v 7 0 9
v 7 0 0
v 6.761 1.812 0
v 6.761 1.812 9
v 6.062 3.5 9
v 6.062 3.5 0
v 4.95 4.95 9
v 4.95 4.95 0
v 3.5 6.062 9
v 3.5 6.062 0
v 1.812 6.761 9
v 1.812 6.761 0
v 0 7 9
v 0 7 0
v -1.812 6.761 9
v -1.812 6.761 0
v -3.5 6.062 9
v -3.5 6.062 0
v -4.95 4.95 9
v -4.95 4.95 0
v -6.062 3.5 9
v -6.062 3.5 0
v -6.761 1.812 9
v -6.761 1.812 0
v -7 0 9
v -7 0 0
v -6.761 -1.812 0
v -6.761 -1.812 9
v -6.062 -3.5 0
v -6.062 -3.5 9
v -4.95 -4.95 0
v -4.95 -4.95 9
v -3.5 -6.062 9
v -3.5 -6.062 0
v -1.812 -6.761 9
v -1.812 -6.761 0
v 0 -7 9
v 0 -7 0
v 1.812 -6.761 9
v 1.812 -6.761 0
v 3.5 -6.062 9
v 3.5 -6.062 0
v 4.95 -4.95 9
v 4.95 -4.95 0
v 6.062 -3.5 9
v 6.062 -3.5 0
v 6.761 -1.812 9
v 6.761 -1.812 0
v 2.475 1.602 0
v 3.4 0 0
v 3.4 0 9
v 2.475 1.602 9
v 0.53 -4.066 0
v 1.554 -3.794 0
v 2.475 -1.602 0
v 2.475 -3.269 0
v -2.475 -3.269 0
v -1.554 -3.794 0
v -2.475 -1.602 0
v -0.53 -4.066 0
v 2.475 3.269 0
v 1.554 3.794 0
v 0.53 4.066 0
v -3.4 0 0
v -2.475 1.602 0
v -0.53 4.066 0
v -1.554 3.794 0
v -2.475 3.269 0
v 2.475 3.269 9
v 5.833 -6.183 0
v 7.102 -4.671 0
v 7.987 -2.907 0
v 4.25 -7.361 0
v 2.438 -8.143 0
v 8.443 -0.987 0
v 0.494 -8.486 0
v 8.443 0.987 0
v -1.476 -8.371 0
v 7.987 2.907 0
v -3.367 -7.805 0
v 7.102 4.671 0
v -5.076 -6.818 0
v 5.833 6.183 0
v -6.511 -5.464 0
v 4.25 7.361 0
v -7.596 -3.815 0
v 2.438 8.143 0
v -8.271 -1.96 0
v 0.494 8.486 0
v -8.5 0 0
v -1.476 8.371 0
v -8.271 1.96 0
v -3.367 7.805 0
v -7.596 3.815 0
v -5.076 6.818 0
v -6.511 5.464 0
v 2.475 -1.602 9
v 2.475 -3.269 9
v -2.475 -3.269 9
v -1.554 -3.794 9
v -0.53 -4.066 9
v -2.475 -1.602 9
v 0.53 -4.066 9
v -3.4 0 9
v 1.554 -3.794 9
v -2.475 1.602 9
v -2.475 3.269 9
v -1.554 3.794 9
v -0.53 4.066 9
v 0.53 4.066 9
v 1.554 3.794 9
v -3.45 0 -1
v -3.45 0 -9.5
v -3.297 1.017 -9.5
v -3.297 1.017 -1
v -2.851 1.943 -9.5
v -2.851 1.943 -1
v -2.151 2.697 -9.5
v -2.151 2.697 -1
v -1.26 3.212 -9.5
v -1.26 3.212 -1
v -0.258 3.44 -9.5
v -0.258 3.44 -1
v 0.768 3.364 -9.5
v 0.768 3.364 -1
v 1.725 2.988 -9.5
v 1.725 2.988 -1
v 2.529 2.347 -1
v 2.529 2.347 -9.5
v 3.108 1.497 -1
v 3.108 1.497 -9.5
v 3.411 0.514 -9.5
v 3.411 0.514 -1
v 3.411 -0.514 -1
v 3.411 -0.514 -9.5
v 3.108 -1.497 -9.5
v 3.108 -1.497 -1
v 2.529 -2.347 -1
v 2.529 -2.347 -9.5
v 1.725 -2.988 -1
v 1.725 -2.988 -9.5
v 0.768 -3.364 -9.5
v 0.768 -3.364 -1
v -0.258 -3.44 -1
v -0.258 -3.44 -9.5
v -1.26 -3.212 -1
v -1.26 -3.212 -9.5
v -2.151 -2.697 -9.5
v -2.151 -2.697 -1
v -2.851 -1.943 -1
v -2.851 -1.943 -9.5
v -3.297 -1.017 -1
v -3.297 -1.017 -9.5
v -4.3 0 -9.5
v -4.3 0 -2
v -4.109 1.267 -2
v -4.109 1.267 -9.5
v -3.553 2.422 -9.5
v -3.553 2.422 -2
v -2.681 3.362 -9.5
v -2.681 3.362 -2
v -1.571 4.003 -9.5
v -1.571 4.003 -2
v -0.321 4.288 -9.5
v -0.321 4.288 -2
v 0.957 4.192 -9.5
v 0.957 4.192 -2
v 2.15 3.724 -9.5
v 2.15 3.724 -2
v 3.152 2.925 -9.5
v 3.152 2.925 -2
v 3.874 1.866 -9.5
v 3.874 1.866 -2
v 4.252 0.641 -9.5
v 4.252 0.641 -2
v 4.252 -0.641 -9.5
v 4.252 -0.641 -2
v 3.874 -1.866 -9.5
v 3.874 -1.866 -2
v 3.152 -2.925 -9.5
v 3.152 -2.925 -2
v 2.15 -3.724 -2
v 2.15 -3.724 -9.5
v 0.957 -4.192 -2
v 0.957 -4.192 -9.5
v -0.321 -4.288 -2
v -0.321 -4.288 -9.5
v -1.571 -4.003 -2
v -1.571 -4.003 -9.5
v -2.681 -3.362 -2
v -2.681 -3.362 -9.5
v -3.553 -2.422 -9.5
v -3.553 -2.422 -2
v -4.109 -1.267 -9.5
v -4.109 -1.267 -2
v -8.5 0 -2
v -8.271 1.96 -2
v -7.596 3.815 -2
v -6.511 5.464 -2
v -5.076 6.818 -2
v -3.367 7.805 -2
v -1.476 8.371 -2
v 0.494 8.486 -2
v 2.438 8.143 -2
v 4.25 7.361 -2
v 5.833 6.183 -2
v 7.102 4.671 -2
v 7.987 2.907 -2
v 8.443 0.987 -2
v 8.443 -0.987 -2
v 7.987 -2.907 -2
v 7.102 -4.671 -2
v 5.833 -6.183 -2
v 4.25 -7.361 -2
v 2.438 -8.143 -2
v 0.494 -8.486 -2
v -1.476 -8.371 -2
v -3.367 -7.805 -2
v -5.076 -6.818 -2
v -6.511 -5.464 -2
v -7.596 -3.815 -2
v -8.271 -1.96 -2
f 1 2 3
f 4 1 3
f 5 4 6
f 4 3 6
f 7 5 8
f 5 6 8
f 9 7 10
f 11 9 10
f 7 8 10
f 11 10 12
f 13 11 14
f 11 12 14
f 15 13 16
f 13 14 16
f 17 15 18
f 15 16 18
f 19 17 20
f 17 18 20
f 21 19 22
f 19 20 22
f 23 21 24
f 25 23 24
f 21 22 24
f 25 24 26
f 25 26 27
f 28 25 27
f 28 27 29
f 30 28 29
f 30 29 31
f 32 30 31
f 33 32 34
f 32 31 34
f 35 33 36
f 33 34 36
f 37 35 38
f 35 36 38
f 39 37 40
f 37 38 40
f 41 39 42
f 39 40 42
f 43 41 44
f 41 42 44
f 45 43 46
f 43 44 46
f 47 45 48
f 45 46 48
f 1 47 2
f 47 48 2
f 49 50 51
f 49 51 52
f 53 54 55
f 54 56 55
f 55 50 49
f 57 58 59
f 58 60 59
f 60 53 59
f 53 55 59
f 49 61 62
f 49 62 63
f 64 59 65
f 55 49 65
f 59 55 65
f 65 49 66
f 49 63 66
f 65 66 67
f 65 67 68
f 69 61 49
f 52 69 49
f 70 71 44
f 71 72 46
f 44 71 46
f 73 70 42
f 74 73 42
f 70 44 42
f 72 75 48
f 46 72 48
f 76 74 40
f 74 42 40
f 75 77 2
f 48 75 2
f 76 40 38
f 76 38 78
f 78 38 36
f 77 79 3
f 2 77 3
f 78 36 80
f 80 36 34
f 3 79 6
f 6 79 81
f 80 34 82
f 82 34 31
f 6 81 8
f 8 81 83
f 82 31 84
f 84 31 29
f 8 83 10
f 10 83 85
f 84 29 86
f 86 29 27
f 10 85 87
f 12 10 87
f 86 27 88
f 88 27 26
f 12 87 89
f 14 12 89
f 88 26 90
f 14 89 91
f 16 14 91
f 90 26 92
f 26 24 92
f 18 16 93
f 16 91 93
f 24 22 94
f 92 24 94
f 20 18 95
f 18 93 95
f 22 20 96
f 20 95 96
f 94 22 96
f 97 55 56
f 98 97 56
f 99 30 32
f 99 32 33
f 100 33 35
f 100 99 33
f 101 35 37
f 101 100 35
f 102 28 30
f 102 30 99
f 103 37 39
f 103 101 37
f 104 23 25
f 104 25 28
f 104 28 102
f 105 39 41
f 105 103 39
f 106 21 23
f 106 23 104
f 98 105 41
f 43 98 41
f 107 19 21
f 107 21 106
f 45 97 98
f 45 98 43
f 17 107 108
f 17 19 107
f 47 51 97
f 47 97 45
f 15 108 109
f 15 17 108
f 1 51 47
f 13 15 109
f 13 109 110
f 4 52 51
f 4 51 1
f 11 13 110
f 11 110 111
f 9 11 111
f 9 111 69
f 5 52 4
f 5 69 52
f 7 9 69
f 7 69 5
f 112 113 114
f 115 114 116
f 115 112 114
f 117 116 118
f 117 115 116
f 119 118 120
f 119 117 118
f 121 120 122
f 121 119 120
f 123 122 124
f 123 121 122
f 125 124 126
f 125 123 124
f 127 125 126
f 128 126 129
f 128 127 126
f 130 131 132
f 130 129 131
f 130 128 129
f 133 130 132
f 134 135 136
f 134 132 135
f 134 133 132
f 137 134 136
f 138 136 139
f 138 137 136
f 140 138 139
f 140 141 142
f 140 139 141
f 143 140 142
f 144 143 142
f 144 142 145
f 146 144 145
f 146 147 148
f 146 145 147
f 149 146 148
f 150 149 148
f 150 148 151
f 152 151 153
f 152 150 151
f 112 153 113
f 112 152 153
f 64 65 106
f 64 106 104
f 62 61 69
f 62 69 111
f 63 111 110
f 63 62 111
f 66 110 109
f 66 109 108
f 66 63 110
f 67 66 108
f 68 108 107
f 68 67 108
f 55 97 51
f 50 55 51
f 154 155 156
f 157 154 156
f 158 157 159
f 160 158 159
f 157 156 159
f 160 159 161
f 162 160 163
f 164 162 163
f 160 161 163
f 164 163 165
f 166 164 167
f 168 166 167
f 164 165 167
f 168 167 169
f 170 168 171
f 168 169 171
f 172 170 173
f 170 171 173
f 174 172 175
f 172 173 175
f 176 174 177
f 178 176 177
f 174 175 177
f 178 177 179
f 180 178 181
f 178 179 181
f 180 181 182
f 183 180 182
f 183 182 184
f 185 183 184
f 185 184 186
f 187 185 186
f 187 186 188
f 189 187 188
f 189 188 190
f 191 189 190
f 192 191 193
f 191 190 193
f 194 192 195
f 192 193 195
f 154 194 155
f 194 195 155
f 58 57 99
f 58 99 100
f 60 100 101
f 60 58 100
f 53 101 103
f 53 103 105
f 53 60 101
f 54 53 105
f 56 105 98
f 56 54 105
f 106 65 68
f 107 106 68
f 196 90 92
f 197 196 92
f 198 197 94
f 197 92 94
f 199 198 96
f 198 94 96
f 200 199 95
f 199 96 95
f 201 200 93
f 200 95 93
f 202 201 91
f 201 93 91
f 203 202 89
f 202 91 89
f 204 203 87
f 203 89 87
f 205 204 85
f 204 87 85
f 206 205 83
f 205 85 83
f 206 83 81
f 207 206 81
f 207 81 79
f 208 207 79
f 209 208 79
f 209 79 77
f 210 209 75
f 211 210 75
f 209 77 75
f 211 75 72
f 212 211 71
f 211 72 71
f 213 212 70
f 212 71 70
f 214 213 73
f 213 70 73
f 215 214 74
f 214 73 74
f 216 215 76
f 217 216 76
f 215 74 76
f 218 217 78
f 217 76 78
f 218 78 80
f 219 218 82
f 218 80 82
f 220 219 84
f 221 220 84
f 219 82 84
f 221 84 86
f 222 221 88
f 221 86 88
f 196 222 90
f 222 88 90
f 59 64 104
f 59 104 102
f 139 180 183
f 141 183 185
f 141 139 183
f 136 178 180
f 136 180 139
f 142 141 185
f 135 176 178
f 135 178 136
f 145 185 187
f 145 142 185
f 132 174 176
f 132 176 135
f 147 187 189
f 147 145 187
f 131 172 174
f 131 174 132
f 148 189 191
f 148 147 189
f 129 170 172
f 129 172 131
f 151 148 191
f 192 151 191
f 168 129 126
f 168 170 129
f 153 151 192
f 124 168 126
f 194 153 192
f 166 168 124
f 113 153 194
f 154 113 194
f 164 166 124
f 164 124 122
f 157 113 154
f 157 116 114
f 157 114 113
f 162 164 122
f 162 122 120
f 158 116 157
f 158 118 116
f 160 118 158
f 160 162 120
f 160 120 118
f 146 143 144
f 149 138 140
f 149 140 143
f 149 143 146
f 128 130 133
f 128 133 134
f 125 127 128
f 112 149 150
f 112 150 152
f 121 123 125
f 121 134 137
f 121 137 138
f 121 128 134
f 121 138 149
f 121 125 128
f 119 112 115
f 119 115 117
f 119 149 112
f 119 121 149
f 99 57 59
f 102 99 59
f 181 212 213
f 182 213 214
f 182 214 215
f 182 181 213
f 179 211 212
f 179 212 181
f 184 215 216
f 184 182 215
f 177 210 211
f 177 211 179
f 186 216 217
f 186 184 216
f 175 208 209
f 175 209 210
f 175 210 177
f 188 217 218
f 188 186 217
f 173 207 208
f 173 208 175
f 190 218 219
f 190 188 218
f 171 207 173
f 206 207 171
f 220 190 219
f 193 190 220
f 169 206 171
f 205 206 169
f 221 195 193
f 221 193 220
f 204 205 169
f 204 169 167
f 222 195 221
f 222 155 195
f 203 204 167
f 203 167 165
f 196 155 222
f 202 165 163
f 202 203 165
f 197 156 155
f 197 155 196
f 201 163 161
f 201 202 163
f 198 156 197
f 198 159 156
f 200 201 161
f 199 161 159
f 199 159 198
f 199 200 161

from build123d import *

# Parameters (mm, degrees)
SKETCH1_R               = 7
SKETCH1_R_2             = 4.1
BOSS_EXTRUDE1_DEPTH     = 9
SKETCH5_R               = 8.5
BOSS_EXTRUDE3_DEPTH     = 2
CUT_EXTRUDE4_DEPTH      = 16.016657418
SKETCH10_R              = 4.3
BOSS_EXTRUDE4_DEPTH     = 7.5
CUT_EXTRUDE8_DEPTH      = 17.294170737
CUT_EXTRUDE8_DEPTH_BACK = 1
SKETCH6_R               = 3.45


with BuildPart() as part:
    # Sketch1 → Boss-Extrude1 (new body)
    # profile 1 of 3: a face of its own
    with BuildSketch(Plane.XY):
        Circle(SKETCH1_R)
        Circle(SKETCH1_R_2, mode=Mode.SUBTRACT)
    # profile 2 of 3: a face of its own
    with BuildSketch(Plane.XY):
        with BuildLine():
            Line((-2.475, -3.268696223), (-2.475, 3.268696223))
            ThreePointArc((-2.475, 3.268696223), (-4.1, 0), (-2.475, -3.268696223))
        make_face()
    # profile 3 of 3: a face of its own
    with BuildSketch(Plane.XY):
        with BuildLine():
            ThreePointArc((4.1, 0), (3.671341717, 1.825171225), (2.475, 3.268696223))
            Line((2.475, 3.268696223), (2.475, -3.268696223))
            ThreePointArc((2.475, -3.268696223), (3.671341717, -1.825171225), (4.1, 0))
        make_face()
    extrude(amount=BOSS_EXTRUDE1_DEPTH)

    # Sketch5 → Boss-Extrude3 (add)
    with BuildSketch(Plane(origin=(0, 0, 0), x_dir=(-1, 0, 0), z_dir=(0, 0, -1))):
        Circle(SKETCH5_R)
    extrude(amount=BOSS_EXTRUDE3_DEPTH)

    # Sketch9 → Cut-Extrude4 (cut, through all)
    with BuildSketch(Plane.XY):
        Polygon((-3.4, 0), (-1.7, -2.944486373), (1.7, -2.944486373), (3.4, 0), (1.7, 2.944486373), (-1.7, 2.944486373), align=None)
    extrude(amount=CUT_EXTRUDE4_DEPTH, mode=Mode.SUBTRACT)

    # Sketch10 → Boss-Extrude4 (add)
    with BuildSketch(Plane(origin=(0, 0, -2), x_dir=(-1, 0, 0), z_dir=(0, 0, -1))):
        Circle(SKETCH10_R)
    extrude(amount=BOSS_EXTRUDE4_DEPTH)

    # Sketch6 → Cut-Extrude8 (cut, two sides: drawn at the far end of the back side and taken through both)
    with BuildSketch(Plane(origin=(0, 0, -2), x_dir=(-1, 0, 0), z_dir=(0, 0, -1)).offset(-CUT_EXTRUDE8_DEPTH_BACK)):
        Circle(SKETCH6_R)
    extrude(amount=CUT_EXTRUDE8_DEPTH + CUT_EXTRUDE8_DEPTH_BACK, mode=Mode.SUBTRACT)


solid = part.part
